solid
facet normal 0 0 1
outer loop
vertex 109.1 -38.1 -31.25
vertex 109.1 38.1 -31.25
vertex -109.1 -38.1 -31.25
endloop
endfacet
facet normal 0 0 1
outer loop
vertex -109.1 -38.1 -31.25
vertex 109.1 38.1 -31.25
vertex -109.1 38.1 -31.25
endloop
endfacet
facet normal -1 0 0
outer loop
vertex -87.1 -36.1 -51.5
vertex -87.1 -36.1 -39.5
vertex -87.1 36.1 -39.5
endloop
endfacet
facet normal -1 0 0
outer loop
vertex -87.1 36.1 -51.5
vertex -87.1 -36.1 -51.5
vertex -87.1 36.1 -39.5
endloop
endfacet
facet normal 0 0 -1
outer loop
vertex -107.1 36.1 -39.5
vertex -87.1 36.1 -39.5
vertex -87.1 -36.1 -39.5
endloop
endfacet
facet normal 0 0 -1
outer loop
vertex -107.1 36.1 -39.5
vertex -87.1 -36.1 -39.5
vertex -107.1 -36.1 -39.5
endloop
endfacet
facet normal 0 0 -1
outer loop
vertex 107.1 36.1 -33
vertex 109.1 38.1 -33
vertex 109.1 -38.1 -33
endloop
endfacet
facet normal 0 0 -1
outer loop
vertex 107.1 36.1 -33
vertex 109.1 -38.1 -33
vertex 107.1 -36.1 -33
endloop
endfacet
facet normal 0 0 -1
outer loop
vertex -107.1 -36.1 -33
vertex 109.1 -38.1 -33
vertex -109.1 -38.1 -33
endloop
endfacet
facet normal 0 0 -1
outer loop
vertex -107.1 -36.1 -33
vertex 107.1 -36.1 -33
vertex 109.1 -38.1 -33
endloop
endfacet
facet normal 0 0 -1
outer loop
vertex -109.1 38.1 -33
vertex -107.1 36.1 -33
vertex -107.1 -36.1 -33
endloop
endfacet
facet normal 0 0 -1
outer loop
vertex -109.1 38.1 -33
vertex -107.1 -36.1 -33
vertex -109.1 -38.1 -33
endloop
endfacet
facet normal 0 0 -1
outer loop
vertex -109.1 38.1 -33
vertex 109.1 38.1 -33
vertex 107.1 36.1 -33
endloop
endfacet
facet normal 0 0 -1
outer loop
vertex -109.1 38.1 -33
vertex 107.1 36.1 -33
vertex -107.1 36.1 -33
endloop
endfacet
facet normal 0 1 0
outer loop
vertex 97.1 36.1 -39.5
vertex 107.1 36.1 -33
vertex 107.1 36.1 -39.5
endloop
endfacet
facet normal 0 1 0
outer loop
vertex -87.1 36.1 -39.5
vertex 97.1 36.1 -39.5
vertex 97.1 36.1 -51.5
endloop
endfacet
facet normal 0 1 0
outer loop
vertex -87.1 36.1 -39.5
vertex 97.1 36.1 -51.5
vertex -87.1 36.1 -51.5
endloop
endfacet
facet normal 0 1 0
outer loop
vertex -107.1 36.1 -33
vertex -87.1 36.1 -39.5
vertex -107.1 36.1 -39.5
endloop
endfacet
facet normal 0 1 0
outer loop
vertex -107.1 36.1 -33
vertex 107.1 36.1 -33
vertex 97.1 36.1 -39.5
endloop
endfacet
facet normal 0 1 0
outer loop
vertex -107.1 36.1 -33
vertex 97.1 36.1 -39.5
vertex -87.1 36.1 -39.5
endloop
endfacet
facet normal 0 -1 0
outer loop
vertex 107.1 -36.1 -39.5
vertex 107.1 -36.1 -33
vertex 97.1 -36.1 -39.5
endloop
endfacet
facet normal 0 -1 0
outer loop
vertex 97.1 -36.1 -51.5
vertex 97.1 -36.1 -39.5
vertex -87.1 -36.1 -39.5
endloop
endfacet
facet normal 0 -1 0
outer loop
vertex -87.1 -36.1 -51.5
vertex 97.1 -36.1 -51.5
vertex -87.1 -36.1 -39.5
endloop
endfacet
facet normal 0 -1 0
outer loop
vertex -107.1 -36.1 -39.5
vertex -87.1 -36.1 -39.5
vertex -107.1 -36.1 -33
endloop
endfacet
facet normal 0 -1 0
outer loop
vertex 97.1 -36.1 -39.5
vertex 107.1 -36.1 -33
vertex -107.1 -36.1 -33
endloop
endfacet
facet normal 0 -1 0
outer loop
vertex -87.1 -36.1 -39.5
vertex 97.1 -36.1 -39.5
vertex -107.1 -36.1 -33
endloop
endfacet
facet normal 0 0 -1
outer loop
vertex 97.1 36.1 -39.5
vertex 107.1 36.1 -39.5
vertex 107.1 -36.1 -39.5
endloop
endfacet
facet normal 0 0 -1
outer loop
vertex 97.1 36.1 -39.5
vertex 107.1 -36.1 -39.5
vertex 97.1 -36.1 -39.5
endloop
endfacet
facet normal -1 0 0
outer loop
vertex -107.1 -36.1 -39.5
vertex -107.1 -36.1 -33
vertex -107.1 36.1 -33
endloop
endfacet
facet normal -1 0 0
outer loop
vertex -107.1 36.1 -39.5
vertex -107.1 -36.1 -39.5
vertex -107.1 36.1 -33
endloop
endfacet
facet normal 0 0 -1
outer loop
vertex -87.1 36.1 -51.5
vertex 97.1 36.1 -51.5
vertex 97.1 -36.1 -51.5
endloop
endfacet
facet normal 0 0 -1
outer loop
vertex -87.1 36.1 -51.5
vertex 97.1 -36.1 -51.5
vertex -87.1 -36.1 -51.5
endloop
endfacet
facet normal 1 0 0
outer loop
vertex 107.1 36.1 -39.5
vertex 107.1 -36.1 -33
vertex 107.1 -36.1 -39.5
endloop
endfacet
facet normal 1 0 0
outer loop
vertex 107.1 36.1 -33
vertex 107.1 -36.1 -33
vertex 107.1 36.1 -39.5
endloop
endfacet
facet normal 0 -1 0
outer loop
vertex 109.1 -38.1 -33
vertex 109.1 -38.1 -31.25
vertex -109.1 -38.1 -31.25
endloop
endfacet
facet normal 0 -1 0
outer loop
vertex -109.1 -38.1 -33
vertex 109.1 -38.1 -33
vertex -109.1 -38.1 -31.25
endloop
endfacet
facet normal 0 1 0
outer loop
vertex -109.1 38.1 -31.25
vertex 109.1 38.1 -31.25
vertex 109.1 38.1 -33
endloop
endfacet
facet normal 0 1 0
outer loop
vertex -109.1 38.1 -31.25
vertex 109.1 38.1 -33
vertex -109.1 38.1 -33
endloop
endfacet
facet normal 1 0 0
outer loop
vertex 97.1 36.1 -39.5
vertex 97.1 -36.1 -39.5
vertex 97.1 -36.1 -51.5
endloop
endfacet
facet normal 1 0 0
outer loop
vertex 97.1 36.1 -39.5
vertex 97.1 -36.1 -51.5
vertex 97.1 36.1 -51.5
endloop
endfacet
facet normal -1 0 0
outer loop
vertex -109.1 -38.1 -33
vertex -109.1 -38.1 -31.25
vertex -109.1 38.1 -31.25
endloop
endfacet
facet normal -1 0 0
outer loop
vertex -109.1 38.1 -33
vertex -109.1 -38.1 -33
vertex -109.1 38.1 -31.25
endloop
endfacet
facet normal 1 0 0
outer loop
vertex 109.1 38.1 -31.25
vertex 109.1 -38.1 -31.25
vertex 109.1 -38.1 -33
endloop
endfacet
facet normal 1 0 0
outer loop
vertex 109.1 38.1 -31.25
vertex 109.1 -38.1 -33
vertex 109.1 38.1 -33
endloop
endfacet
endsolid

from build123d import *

# Parameters (mm, degrees)
SKETCH004_W             = 218.2
SKETCH004_H             = 76.2
PAD004_DEPTH            = 1.75
SKETCH005_W             = 214.2
SKETCH005_H             = 72.2
PAD005_DEPTH            = 6.5
SKETCH006_W             = 184.2
SKETCH006_H             = 72.2
PAD006_DEPTH            = 12
BODY003_PLACEMENT_ANGLE = 180


with BuildPart() as part:
    # Sketch004 (on CopyDatumPlane) → Pad004 (new body)
    with BuildSketch(Plane(origin=(0, 0, -31.25), x_dir=(1, 0, 0), z_dir=(0, 0, -1))):
        Rectangle(SKETCH004_W, SKETCH004_H)
    extrude(amount=PAD004_DEPTH)

    # Sketch005 (on Face6 of Pad004) → Pad005 (join)
    with BuildSketch(Plane(origin=(0, 0, -33), x_dir=(1, 0, 0), z_dir=(0, 0, -1))):
        Rectangle(SKETCH005_W, SKETCH005_H)
    extrude(amount=PAD005_DEPTH)

    # Sketch006 (on Face11 of Pad005) → Pad006 (join)
    with BuildSketch(Plane(origin=(0, 0, -39.5), x_dir=(1, 0, 0), z_dir=(0, 0, -1))):
        with Locations((-5, 0)):
            Rectangle(SKETCH006_W, SKETCH006_H)
    extrude(amount=PAD006_DEPTH)


with BuildPart() as part_1:
    # Body003 placement: moved
    add(part.part.rotate(Axis((0, 0, 0), (0, 0, 1)), BODY003_PLACEMENT_ANGLE))


solid = part_1.part
